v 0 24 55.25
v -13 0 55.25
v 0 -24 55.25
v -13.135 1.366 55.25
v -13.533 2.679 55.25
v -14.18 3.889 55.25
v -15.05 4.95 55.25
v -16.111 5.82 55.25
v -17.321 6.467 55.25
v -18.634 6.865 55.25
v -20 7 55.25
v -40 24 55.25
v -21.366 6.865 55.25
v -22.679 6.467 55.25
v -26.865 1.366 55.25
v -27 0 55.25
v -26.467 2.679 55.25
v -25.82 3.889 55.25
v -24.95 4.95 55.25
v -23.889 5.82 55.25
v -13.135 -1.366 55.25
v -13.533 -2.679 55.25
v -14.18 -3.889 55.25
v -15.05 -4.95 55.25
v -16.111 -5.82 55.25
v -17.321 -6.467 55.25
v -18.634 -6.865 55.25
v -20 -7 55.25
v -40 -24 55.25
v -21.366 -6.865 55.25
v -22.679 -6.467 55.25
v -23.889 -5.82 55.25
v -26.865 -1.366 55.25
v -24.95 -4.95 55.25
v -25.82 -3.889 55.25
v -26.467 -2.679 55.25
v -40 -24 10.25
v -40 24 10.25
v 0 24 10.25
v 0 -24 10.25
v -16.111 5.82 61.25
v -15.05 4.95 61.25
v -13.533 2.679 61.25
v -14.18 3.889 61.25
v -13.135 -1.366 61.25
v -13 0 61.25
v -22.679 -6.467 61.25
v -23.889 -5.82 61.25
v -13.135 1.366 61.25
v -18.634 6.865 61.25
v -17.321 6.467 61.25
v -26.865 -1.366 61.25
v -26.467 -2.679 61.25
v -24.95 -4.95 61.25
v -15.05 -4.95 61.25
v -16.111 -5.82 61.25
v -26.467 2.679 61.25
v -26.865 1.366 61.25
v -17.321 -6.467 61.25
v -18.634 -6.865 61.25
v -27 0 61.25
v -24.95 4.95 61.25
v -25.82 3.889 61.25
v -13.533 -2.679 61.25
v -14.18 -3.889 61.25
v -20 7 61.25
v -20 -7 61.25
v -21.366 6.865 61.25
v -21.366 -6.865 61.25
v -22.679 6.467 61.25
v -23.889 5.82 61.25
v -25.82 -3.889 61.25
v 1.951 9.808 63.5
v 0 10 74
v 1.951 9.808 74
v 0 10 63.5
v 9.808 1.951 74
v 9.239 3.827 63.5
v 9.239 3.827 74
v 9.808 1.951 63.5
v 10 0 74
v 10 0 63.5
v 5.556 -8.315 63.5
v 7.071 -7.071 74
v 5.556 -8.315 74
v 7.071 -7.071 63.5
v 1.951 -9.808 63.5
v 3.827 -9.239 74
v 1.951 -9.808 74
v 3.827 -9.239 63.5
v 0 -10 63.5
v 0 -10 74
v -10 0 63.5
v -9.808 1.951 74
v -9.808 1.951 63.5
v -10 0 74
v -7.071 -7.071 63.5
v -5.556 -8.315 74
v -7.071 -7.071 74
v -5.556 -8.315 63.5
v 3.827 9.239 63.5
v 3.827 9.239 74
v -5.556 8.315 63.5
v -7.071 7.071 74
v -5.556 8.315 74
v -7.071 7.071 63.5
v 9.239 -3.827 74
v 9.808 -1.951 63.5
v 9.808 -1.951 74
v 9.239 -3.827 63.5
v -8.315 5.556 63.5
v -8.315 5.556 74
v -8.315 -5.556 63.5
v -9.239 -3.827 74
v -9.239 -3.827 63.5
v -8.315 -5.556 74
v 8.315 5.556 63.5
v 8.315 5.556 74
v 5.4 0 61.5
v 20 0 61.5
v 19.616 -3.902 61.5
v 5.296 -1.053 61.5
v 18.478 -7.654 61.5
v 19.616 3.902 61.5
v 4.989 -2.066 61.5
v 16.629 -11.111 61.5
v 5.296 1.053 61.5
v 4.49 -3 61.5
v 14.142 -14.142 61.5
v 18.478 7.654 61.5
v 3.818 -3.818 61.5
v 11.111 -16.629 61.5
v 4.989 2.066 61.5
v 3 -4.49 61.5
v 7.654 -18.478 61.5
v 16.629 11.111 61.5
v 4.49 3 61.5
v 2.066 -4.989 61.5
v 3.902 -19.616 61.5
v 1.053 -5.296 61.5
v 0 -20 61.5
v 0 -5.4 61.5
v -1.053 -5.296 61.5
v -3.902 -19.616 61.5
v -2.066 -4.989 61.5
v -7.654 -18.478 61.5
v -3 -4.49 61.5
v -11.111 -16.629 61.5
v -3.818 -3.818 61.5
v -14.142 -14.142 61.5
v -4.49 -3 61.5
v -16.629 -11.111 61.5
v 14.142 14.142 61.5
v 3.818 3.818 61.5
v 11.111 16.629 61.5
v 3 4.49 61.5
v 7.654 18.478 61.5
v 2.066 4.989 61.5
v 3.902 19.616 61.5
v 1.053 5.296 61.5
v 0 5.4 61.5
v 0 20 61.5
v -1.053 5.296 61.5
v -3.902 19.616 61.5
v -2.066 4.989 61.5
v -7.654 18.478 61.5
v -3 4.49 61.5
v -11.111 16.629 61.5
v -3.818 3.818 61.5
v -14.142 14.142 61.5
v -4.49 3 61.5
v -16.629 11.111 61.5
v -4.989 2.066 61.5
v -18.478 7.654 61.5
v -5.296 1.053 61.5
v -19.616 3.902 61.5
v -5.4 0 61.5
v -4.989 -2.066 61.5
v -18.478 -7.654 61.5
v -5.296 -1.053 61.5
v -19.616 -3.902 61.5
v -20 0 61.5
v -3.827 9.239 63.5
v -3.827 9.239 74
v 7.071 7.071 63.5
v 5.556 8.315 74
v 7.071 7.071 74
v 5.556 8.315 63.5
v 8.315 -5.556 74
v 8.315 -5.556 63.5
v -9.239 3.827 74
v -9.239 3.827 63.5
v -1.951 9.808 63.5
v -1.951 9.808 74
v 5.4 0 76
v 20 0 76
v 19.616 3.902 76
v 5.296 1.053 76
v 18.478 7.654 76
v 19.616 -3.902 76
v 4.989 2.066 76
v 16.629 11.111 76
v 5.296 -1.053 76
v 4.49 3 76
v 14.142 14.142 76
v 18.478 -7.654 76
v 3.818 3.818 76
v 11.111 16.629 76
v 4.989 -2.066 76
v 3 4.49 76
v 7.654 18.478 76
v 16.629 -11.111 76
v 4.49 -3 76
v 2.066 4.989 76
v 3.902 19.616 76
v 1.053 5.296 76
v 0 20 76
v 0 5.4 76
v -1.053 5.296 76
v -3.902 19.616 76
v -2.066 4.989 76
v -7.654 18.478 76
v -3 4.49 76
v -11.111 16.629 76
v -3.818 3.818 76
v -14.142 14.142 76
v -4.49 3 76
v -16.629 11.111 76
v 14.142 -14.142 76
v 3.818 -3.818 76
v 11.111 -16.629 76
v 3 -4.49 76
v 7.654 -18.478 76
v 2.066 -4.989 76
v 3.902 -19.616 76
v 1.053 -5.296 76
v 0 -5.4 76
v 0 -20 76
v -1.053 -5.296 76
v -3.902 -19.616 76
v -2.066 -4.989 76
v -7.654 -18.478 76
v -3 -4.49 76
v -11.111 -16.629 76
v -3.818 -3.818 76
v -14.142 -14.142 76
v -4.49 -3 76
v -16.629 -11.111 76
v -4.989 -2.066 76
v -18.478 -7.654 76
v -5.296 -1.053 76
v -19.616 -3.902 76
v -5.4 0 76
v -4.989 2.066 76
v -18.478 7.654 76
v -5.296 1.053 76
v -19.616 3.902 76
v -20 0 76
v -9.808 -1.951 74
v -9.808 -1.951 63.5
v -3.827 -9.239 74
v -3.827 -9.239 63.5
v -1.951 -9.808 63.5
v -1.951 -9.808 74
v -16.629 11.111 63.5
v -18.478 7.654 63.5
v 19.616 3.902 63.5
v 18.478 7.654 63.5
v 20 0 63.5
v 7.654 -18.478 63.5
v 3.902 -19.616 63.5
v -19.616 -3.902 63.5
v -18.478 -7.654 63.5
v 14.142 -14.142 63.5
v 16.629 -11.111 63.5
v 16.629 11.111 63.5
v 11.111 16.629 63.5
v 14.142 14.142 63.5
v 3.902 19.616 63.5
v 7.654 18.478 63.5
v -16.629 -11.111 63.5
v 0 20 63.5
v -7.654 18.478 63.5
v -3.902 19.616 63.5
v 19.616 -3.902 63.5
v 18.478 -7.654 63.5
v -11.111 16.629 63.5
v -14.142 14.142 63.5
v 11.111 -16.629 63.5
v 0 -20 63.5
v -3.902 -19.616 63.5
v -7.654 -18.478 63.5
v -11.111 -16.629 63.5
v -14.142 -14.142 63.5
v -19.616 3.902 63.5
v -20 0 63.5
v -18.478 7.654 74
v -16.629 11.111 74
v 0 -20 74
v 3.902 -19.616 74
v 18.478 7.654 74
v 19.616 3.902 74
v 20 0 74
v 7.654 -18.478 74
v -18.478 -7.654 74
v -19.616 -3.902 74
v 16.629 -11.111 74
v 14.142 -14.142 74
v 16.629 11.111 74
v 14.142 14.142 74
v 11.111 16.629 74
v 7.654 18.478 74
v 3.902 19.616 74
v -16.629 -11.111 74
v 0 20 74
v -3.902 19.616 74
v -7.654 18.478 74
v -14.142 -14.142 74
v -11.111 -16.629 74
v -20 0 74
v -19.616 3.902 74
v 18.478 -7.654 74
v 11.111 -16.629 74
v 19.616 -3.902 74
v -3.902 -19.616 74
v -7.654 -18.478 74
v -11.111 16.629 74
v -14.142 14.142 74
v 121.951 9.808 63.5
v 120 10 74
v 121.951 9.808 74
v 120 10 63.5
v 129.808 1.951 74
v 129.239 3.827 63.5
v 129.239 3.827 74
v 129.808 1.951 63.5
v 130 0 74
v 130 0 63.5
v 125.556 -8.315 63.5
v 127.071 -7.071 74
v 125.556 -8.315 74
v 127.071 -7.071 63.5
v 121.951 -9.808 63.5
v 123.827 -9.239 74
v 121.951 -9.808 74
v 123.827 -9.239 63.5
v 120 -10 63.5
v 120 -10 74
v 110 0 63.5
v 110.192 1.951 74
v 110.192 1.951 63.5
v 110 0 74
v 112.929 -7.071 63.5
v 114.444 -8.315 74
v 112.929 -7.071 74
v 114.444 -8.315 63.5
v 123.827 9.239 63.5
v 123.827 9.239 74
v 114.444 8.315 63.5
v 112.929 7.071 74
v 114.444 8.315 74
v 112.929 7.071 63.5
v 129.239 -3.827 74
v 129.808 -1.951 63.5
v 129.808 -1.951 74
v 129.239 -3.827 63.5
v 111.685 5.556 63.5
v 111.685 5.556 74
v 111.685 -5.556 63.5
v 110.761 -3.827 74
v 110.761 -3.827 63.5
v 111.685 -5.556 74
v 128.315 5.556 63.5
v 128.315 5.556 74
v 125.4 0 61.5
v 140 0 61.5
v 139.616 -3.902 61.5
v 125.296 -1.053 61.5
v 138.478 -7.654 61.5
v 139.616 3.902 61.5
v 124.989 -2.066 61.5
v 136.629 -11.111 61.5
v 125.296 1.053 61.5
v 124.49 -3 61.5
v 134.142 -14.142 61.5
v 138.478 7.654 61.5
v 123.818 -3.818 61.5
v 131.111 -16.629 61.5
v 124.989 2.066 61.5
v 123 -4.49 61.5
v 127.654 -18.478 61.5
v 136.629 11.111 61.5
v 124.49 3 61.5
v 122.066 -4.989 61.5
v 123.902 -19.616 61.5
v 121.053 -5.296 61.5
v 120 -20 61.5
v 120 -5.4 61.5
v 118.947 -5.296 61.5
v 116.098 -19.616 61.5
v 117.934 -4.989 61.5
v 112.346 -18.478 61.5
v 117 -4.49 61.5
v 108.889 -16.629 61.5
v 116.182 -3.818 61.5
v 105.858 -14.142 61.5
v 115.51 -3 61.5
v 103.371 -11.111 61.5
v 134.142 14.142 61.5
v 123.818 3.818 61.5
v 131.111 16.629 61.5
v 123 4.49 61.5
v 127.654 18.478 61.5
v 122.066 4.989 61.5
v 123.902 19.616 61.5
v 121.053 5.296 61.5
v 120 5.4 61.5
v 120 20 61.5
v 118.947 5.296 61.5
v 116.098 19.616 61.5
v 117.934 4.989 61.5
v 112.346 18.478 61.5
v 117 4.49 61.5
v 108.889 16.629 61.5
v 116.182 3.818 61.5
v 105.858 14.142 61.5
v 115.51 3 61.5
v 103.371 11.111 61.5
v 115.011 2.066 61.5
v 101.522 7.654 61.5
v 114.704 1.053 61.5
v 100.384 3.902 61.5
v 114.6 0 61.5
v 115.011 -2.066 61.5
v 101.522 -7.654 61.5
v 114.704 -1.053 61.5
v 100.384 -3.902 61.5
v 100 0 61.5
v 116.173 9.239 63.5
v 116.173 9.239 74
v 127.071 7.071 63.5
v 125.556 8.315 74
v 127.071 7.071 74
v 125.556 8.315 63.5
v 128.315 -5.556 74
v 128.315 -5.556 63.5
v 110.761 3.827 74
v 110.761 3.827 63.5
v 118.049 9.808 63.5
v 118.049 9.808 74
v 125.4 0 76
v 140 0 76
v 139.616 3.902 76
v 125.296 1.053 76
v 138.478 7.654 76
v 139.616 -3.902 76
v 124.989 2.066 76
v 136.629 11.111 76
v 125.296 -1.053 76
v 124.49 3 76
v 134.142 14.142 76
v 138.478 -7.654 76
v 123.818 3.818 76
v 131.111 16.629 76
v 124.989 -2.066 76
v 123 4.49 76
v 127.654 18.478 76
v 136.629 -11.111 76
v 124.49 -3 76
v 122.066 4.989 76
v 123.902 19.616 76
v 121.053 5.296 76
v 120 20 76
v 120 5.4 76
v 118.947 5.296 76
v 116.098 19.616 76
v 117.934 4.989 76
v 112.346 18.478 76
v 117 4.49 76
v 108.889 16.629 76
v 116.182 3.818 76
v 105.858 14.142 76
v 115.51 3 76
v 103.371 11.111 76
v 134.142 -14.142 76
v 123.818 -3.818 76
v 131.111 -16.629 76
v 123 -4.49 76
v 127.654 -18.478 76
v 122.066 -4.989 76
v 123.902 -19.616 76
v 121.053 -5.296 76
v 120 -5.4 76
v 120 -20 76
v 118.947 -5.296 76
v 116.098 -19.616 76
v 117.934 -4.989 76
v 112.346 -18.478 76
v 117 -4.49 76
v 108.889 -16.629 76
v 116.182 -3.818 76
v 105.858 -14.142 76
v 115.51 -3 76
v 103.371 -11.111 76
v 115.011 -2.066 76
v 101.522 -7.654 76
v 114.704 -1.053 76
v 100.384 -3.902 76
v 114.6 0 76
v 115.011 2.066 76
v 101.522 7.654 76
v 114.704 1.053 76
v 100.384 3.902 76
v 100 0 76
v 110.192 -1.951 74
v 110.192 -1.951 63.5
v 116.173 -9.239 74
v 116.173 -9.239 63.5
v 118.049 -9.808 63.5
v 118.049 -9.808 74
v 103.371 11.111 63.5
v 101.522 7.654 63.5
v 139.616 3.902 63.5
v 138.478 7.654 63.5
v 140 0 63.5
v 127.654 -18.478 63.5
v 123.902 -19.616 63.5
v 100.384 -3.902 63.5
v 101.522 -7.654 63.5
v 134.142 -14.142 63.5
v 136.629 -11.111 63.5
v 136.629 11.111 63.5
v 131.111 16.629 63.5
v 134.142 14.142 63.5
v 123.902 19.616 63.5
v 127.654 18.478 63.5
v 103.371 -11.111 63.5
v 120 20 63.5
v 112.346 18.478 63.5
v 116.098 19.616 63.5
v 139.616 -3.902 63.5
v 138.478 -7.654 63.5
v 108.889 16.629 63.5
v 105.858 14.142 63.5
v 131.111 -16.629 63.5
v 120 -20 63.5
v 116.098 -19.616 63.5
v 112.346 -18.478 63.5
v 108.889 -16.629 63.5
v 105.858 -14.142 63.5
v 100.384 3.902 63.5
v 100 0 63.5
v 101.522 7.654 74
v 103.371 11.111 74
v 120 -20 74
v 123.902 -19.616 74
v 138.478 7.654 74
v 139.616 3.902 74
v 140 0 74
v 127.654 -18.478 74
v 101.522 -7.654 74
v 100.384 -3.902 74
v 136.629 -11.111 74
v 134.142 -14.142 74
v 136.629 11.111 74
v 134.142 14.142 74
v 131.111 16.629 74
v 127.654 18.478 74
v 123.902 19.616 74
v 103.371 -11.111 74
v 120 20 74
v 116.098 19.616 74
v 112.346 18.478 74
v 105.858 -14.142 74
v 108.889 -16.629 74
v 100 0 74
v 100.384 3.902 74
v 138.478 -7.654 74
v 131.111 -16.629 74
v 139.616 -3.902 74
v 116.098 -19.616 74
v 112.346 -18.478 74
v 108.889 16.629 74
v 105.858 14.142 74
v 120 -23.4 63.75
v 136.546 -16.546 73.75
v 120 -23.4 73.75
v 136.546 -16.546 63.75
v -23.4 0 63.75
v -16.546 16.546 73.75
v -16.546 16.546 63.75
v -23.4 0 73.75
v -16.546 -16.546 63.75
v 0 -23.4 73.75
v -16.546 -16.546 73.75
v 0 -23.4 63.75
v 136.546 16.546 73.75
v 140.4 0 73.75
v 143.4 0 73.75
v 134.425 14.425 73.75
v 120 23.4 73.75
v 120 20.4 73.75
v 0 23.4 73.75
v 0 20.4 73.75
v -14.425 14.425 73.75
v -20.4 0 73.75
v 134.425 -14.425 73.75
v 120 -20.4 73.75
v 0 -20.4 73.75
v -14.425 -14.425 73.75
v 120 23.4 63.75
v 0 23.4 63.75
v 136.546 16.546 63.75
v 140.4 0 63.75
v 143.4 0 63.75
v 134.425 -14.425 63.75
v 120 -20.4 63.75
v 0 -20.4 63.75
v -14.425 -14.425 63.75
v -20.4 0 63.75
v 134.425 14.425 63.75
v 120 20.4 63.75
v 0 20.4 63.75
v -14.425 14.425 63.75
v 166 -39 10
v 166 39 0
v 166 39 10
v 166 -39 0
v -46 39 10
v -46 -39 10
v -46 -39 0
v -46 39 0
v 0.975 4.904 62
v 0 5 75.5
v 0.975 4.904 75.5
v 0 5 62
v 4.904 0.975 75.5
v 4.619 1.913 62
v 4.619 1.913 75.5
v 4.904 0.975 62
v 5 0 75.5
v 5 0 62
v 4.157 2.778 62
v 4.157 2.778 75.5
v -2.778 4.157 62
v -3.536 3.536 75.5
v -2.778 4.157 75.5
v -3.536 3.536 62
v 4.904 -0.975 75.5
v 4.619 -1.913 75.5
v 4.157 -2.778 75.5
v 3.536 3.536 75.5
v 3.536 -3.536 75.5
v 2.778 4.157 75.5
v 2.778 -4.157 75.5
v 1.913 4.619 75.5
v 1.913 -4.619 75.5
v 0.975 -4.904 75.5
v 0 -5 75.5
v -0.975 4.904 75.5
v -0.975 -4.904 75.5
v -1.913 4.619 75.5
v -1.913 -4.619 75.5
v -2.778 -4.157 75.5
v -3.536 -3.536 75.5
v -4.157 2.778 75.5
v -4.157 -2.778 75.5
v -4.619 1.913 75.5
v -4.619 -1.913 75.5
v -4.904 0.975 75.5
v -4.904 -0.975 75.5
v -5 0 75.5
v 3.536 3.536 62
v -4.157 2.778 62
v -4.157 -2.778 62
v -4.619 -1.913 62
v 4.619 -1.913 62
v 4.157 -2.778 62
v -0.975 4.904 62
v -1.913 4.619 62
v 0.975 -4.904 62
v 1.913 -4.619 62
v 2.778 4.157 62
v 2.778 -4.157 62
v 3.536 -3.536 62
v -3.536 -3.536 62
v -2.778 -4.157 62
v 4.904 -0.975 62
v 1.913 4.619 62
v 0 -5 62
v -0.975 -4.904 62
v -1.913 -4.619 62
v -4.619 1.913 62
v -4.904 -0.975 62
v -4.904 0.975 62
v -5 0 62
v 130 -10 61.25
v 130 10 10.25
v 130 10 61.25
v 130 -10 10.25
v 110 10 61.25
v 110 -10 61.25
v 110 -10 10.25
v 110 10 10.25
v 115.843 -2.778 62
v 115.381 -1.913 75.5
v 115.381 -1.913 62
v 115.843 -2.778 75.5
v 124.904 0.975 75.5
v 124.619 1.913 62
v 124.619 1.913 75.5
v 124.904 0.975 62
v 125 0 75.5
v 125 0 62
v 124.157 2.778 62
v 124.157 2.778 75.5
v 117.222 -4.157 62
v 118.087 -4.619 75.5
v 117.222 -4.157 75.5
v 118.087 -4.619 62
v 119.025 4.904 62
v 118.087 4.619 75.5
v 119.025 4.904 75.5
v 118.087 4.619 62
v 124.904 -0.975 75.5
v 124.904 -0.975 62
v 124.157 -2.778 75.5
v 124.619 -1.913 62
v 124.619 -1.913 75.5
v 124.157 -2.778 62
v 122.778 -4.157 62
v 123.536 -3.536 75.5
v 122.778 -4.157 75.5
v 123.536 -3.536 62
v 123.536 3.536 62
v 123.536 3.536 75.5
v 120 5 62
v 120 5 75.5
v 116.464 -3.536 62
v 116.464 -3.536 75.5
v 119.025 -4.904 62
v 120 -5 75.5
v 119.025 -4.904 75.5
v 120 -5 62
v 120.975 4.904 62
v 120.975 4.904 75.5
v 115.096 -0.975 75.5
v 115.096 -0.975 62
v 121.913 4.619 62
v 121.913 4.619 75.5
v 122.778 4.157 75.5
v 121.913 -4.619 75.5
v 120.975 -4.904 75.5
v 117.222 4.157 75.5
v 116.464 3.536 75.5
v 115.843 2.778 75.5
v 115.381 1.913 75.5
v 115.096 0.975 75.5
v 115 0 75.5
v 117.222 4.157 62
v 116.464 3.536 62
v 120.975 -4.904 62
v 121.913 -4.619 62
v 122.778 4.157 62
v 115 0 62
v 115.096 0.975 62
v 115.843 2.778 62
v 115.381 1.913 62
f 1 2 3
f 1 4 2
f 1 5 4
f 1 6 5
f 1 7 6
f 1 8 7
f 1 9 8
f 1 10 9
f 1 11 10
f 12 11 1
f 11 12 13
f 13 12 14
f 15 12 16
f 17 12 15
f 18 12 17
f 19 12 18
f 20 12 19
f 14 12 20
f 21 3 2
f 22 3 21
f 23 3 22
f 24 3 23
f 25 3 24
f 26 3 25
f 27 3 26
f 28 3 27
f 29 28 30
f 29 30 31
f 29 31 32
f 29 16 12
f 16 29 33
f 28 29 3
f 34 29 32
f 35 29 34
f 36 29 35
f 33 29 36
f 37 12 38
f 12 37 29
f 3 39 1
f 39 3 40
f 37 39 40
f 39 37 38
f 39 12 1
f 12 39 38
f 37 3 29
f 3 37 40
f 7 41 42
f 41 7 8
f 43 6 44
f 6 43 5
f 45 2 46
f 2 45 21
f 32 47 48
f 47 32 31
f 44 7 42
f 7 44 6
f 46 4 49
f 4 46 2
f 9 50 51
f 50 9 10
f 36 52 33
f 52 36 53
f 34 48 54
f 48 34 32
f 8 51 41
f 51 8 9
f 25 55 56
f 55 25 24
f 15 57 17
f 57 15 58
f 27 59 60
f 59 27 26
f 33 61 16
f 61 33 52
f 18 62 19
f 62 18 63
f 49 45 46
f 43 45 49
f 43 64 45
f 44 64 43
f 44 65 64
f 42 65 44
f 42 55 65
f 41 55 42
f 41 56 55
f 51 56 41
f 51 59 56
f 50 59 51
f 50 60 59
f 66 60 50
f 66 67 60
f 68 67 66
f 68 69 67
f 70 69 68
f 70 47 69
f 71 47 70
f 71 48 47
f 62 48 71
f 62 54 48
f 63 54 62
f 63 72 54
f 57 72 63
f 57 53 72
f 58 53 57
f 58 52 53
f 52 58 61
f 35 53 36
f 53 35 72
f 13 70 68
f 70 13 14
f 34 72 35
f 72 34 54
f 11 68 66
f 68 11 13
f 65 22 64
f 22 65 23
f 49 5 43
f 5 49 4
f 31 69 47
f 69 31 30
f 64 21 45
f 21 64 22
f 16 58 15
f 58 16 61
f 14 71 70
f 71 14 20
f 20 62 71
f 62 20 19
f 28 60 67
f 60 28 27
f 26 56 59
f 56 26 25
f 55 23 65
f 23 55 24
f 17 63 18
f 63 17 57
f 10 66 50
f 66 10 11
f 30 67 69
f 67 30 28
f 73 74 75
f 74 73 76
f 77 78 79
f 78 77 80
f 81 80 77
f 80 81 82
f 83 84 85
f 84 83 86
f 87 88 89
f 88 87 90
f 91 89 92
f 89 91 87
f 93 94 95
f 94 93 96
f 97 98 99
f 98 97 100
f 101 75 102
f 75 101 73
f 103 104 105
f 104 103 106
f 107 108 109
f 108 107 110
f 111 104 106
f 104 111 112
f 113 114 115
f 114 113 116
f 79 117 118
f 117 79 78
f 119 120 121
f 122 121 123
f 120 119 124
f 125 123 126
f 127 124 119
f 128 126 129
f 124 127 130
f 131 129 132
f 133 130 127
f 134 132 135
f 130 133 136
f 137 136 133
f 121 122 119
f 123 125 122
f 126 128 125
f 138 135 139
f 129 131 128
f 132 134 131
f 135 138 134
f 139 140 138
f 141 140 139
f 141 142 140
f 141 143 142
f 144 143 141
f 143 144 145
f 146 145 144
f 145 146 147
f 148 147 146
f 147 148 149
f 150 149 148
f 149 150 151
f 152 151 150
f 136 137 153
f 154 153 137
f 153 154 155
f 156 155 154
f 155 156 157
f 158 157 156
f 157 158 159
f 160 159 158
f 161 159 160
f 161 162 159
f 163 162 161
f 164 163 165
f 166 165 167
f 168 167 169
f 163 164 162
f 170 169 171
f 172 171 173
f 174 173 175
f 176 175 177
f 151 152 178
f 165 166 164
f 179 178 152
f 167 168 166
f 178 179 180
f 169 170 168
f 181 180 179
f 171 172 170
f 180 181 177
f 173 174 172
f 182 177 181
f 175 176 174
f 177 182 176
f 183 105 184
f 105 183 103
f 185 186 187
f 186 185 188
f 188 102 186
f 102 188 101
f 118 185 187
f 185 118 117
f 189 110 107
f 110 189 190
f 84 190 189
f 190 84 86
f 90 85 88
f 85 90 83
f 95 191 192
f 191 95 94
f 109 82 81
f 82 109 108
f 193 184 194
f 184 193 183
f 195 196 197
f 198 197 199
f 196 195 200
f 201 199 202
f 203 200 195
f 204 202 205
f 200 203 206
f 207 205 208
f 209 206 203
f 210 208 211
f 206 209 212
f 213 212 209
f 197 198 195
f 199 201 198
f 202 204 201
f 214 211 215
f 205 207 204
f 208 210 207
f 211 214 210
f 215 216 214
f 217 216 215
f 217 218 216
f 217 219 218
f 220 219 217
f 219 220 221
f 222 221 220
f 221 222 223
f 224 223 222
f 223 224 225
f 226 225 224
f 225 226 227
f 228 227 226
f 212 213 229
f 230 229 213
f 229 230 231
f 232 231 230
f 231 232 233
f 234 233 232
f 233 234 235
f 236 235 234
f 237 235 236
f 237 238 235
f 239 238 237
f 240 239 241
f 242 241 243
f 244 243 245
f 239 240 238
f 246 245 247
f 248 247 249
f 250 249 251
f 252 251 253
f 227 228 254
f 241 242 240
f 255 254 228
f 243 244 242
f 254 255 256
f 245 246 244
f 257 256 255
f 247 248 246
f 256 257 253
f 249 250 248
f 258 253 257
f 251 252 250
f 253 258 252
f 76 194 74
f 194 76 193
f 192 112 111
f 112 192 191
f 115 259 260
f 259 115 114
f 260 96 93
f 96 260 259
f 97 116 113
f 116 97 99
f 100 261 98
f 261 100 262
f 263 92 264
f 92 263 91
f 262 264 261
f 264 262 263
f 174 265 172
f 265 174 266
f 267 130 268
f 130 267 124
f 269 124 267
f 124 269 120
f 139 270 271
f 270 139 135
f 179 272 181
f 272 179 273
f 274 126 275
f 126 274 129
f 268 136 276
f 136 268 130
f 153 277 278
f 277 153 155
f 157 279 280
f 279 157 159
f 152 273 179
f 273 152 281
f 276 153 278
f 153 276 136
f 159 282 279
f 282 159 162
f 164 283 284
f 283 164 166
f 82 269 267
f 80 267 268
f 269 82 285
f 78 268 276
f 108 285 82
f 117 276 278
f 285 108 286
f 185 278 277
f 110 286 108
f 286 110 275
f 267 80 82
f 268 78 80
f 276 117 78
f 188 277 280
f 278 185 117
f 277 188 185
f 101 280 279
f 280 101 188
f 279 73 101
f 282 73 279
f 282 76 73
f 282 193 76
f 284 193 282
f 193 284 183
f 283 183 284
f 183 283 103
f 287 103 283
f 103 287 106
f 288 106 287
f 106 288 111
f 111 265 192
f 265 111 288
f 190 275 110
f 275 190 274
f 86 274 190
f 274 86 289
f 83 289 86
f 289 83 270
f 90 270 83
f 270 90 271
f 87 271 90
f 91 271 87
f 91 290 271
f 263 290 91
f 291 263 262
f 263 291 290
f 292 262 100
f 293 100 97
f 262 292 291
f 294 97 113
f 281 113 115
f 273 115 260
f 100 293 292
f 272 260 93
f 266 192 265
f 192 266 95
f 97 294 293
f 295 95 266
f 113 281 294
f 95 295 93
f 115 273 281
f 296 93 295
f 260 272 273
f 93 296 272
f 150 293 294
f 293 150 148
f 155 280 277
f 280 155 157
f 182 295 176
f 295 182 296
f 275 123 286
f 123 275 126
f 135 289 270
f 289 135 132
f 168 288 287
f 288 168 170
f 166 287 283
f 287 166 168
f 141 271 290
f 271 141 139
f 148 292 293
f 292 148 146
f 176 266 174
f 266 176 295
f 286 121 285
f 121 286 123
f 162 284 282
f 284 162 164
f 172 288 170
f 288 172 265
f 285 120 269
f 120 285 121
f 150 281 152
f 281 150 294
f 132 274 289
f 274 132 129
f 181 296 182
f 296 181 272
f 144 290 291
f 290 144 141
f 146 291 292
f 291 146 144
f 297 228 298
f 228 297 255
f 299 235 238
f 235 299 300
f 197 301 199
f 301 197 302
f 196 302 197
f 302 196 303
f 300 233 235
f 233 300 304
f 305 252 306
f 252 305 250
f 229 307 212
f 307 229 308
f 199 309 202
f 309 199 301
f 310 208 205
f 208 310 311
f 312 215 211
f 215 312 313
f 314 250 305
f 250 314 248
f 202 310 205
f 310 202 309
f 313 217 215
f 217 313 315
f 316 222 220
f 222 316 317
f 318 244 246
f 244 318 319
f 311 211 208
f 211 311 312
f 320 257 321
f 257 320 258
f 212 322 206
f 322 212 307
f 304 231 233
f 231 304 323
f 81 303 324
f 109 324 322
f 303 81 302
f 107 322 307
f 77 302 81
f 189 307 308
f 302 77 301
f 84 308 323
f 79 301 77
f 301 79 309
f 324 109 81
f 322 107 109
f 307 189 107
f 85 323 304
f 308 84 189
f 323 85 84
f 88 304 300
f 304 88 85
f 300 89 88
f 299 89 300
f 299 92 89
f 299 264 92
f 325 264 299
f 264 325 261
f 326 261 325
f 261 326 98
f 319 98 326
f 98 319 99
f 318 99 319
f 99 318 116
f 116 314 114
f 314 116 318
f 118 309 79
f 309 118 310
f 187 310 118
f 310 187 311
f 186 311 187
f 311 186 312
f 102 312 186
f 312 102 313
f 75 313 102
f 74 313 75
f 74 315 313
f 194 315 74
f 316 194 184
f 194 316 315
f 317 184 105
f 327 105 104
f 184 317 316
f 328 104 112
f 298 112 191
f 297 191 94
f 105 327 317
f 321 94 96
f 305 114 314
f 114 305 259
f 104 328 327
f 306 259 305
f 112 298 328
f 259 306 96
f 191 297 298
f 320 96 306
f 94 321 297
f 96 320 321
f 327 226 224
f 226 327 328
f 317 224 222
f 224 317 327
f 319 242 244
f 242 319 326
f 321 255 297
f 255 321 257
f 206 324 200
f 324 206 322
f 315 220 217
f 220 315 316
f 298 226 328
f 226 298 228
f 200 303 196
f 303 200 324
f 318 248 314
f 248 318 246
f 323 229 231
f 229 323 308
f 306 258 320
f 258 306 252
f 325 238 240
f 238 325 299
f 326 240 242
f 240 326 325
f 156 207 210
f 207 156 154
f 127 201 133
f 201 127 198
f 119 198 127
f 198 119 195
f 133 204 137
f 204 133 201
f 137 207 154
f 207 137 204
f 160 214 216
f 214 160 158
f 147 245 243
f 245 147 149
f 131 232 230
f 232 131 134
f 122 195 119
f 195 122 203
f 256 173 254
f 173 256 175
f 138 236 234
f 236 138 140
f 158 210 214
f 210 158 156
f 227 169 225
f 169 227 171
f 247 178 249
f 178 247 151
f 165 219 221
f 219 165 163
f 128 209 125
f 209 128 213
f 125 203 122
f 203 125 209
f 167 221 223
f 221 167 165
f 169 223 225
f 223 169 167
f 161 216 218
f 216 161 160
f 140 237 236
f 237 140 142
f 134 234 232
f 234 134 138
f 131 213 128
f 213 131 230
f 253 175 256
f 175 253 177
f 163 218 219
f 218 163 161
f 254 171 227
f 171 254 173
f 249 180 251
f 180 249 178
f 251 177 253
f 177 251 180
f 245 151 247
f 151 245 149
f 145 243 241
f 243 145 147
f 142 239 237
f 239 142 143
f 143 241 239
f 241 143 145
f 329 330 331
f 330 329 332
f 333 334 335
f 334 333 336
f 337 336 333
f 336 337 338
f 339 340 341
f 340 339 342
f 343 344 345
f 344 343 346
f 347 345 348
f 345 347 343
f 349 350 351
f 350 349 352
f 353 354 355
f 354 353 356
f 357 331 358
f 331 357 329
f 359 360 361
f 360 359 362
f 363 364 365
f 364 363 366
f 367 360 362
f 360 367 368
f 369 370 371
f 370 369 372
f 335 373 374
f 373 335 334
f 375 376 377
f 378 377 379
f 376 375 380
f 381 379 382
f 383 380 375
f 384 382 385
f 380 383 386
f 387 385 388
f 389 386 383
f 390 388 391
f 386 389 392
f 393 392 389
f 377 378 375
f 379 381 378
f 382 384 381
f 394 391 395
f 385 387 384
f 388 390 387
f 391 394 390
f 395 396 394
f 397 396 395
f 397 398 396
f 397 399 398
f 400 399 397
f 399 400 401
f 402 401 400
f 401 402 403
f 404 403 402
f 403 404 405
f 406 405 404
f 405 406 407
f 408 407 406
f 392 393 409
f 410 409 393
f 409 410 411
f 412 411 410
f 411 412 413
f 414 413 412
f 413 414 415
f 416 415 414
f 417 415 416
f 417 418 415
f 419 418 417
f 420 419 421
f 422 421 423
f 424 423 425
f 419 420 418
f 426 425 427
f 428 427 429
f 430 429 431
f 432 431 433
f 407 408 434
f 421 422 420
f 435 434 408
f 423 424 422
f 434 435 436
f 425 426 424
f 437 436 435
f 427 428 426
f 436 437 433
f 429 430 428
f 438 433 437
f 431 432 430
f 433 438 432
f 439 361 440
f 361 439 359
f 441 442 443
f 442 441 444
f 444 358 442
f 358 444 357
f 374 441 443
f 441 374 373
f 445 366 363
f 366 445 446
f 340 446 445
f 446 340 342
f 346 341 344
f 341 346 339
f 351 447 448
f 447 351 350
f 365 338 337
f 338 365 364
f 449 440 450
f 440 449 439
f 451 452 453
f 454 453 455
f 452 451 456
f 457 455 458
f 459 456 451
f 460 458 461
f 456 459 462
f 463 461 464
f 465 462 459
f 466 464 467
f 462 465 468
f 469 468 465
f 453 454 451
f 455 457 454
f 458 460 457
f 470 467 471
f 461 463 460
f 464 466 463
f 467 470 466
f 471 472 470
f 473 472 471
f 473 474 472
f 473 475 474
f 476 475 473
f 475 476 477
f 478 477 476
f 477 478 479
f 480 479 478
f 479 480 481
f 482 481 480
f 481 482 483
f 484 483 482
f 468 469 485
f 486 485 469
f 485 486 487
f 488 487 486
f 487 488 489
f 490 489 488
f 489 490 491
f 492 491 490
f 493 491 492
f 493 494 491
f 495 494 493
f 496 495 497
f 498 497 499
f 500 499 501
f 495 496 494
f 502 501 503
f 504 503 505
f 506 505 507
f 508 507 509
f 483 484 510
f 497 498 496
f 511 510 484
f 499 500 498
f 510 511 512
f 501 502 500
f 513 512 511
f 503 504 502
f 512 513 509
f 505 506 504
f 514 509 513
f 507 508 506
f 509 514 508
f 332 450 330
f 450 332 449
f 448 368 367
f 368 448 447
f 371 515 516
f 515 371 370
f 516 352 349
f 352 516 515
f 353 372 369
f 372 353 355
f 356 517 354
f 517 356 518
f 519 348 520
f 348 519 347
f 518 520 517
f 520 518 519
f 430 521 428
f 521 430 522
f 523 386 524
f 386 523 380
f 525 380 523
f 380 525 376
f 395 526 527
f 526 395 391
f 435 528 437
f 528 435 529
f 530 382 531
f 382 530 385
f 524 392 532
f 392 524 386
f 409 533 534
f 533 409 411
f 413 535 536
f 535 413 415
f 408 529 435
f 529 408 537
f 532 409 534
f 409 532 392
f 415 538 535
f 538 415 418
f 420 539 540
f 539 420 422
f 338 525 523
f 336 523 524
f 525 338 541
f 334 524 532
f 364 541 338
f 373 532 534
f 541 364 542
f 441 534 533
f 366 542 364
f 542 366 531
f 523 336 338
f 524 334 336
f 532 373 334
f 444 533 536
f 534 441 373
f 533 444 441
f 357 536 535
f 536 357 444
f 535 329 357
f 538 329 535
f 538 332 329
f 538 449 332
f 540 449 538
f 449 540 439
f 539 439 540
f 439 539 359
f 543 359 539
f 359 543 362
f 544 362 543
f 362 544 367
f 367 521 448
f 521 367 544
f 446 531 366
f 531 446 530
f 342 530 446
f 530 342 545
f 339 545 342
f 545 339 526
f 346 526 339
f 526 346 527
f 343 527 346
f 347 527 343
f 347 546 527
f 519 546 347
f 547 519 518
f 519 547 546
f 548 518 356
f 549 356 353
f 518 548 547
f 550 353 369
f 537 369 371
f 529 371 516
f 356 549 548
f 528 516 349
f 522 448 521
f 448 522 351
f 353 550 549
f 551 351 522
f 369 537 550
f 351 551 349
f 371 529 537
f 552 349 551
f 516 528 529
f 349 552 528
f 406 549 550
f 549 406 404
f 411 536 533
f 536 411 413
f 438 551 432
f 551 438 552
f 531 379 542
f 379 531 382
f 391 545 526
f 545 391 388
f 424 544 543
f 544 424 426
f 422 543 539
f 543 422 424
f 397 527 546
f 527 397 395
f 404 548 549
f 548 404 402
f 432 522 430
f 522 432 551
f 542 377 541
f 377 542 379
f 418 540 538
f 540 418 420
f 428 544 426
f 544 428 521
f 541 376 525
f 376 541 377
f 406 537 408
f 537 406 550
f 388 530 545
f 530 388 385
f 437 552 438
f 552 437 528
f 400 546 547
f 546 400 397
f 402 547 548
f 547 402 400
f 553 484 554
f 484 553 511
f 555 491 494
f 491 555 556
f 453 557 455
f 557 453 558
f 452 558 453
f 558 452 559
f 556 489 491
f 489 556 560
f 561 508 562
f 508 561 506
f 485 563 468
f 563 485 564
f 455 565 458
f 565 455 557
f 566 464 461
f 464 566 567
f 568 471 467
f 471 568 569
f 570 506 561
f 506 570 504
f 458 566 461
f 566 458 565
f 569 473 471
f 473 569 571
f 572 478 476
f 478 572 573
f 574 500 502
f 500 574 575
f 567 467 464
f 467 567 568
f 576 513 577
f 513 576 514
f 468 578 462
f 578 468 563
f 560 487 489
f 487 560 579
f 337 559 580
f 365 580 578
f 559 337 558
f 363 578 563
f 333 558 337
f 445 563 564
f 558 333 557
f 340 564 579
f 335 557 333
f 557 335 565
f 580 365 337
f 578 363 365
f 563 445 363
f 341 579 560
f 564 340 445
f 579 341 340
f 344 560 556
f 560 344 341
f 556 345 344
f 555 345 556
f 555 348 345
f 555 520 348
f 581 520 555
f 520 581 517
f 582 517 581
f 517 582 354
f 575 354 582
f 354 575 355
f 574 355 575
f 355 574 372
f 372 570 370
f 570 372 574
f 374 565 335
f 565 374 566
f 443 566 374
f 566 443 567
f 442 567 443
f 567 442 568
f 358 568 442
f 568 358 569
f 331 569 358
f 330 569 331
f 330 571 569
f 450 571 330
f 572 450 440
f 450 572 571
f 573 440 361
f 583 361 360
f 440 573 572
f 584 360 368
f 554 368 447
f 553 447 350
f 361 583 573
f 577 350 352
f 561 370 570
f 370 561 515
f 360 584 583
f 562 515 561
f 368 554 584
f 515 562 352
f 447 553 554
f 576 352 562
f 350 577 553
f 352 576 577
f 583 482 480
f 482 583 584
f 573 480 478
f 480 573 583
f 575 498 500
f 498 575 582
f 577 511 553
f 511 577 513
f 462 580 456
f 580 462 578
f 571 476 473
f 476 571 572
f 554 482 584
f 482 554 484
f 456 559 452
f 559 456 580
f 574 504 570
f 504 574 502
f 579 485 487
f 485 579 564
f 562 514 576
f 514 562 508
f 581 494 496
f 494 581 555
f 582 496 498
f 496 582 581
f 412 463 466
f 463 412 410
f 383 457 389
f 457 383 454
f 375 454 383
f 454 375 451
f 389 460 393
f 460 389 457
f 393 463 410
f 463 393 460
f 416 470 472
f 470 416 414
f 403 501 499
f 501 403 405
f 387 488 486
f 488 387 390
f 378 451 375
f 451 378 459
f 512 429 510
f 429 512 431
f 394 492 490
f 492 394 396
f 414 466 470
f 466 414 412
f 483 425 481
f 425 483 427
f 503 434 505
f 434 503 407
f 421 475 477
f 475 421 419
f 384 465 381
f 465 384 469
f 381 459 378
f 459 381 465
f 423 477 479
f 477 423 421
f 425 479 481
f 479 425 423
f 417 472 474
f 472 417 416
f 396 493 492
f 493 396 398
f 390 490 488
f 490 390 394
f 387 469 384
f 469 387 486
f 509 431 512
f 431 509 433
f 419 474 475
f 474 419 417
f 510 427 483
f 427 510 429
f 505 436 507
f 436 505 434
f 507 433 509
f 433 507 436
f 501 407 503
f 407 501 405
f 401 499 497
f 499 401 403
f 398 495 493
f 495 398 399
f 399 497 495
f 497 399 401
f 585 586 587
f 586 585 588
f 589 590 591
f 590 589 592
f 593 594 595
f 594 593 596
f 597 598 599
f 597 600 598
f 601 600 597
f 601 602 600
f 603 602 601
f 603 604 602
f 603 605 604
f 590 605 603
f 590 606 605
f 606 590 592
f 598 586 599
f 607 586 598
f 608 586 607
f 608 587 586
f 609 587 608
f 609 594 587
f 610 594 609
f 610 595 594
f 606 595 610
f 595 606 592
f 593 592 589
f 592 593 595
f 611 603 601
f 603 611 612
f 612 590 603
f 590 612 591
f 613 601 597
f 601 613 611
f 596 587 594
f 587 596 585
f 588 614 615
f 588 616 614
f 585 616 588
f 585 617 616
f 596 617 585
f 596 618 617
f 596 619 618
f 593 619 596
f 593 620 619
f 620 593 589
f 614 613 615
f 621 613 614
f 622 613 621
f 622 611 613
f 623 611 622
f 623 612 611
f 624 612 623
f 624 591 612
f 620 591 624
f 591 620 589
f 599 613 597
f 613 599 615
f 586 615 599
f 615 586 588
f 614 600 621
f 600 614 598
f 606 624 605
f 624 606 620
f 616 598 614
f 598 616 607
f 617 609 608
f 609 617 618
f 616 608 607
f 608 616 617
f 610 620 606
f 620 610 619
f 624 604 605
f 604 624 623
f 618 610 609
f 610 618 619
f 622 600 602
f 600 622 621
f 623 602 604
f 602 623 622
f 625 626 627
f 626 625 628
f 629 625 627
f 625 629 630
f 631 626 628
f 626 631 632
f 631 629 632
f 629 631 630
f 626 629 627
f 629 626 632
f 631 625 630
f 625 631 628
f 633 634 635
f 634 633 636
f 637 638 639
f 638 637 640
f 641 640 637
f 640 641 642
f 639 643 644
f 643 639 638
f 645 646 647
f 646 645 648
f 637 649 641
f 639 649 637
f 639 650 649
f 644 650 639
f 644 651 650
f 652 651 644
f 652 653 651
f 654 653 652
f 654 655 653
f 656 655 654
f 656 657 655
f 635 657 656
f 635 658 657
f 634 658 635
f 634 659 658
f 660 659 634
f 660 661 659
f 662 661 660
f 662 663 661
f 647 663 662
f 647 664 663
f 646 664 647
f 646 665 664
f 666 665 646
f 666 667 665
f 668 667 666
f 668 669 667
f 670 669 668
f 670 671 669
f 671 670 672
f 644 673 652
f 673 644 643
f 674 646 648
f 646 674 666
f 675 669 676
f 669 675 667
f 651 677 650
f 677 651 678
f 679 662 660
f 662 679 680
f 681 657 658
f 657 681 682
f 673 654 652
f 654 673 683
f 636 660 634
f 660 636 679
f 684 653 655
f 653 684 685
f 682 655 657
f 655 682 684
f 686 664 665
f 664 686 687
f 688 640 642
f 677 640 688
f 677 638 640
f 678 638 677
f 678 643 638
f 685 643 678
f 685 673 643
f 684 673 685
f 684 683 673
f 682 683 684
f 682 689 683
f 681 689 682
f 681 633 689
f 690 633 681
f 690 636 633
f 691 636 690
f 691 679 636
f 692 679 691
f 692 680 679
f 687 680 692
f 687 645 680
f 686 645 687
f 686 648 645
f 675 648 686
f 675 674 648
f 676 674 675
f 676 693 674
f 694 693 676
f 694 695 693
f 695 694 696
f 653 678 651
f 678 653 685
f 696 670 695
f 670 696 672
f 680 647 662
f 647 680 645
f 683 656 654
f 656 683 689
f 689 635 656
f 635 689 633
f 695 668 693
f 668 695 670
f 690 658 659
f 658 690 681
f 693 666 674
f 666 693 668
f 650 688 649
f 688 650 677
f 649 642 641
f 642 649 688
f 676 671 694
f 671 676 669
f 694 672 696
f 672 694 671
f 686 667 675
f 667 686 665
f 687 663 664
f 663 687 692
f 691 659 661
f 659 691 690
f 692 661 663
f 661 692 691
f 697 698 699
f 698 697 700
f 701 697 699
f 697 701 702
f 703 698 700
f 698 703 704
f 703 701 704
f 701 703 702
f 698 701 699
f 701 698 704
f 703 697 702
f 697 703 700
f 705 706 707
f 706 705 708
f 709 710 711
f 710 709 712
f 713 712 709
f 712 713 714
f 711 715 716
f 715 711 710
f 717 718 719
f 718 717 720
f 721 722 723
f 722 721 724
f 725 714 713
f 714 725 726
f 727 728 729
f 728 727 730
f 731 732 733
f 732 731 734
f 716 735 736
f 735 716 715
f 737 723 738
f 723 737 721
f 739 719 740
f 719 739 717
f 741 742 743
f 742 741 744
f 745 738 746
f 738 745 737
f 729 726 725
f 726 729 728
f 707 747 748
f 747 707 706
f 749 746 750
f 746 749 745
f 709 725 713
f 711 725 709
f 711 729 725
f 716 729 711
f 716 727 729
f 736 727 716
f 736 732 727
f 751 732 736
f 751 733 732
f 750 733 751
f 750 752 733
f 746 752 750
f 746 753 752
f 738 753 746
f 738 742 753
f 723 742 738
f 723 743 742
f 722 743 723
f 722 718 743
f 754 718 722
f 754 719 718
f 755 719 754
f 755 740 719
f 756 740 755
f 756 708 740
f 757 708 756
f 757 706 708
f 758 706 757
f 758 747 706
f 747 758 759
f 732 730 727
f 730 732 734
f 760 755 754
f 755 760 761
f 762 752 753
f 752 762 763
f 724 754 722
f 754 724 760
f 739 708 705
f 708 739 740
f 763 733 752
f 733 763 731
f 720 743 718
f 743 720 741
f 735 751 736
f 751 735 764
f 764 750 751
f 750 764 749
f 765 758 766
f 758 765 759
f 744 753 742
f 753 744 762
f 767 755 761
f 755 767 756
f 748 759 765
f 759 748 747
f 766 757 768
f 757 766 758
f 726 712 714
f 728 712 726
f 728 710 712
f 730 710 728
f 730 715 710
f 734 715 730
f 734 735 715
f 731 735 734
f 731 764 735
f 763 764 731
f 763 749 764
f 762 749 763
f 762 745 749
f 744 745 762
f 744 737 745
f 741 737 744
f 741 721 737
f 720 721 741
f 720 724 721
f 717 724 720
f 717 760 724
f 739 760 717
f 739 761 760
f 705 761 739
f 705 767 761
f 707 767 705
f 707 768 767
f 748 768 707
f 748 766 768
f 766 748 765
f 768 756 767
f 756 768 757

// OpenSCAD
$fn = 32;

// ------------------------------------------------------------------------
// Motor belt drive: span 120 mm, pulleys d40, belt 10 mm wide
// Every part is its own module, assembly() places every instance.
// ------------------------------------------------------------------------

// --- part 1 ---
module base_plate() {
  difference() {
    translate([-106, -39, 0]) cube([212, 78, 10]);
  }
}

// --- part 2 ---
module motor() {
  union() {
    translate([-22.5, -24, 0]) cube([45, 48, 40]);
    translate([25.5, 0, 20]) rotate([0, 90, 0]) cylinder(h = 6, d = 14, center = true);
  }
}

// --- part 3 ---
module drive_shaft() {
  translate([0, 0, -6.75]) cylinder(h = 13.5, d = 10);
}

// --- part 4 ---
module pulley_drive() {
  difference() {
    union() {
      cylinder(h = 14.5, d = 20);
      cylinder(h = 2, d = 40);
      translate([0, 0, 12.5]) cylinder(h = 2, d = 40);
    }
    translate([0, 0, -1]) cylinder(h = 16.5, d = 10.8);
  }
}

// --- part 5 ---
module idler_post() {
  translate([-10, -10, 0]) cube([20, 20, 51]);
}

// --- part 6 ---
module driven_shaft() {
  translate([0, 0, -6.75]) cylinder(h = 13.5, d = 10);
}

// --- part 7 ---
module pulley_driven() {
  difference() {
    union() {
      cylinder(h = 14.5, d = 20);
      cylinder(h = 2, d = 40);
      translate([0, 0, 12.5]) cylinder(h = 2, d = 40);
    }
    translate([0, 0, -1]) cylinder(h = 16.5, d = 10.8);
  }
}

// --- part 8 ---
module drive_belt() {
  difference() {
    linear_extrude(height = 10) polygon(points = concat([for (a = [90 : 45 : 270]) [23.4 * cos(a), 23.4 * sin(a)]], [for (a = [270 : 45 : 450]) [120 + 23.4 * cos(a), 23.4 * sin(a)]]));
    translate([0, 0, -1]) linear_extrude(height = 12) polygon(points = concat([for (a = [90 : 45 : 270]) [20.4 * cos(a), 20.4 * sin(a)]], [for (a = [270 : 45 : 450]) [120 + 20.4 * cos(a), 20.4 * sin(a)]]));
  }
}

// --- assembly ---
module assembly() {
  color([0.80, 0.24, 0.20]) translate([60, 0, 0]) rotate([0, 0, 0]) base_plate();
  color([0.20, 0.45, 0.75]) translate([0, 0, 32.75]) rotate([0, 270, 0]) motor();
  color([0.25, 0.62, 0.32]) translate([0, 0, 68.75]) rotate([0, 0, 0]) drive_shaft();
  color([0.92, 0.70, 0.18]) translate([0, 0, 61.5]) rotate([0, 0, 0]) pulley_drive();
  color([0.58, 0.35, 0.70]) translate([120, 0, 10.25]) rotate([0, 0, 0]) idler_post();
  color([0.16, 0.66, 0.66]) translate([120, 0, 68.75]) rotate([0, 0, 0]) driven_shaft();
  color([0.85, 0.48, 0.18]) translate([120, 0, 61.5]) rotate([0, 0, 0]) pulley_driven();
  color([0.55, 0.60, 0.65]) translate([0, 0, 63.75]) rotate([0, 0, 0]) drive_belt();
}

assembly();
